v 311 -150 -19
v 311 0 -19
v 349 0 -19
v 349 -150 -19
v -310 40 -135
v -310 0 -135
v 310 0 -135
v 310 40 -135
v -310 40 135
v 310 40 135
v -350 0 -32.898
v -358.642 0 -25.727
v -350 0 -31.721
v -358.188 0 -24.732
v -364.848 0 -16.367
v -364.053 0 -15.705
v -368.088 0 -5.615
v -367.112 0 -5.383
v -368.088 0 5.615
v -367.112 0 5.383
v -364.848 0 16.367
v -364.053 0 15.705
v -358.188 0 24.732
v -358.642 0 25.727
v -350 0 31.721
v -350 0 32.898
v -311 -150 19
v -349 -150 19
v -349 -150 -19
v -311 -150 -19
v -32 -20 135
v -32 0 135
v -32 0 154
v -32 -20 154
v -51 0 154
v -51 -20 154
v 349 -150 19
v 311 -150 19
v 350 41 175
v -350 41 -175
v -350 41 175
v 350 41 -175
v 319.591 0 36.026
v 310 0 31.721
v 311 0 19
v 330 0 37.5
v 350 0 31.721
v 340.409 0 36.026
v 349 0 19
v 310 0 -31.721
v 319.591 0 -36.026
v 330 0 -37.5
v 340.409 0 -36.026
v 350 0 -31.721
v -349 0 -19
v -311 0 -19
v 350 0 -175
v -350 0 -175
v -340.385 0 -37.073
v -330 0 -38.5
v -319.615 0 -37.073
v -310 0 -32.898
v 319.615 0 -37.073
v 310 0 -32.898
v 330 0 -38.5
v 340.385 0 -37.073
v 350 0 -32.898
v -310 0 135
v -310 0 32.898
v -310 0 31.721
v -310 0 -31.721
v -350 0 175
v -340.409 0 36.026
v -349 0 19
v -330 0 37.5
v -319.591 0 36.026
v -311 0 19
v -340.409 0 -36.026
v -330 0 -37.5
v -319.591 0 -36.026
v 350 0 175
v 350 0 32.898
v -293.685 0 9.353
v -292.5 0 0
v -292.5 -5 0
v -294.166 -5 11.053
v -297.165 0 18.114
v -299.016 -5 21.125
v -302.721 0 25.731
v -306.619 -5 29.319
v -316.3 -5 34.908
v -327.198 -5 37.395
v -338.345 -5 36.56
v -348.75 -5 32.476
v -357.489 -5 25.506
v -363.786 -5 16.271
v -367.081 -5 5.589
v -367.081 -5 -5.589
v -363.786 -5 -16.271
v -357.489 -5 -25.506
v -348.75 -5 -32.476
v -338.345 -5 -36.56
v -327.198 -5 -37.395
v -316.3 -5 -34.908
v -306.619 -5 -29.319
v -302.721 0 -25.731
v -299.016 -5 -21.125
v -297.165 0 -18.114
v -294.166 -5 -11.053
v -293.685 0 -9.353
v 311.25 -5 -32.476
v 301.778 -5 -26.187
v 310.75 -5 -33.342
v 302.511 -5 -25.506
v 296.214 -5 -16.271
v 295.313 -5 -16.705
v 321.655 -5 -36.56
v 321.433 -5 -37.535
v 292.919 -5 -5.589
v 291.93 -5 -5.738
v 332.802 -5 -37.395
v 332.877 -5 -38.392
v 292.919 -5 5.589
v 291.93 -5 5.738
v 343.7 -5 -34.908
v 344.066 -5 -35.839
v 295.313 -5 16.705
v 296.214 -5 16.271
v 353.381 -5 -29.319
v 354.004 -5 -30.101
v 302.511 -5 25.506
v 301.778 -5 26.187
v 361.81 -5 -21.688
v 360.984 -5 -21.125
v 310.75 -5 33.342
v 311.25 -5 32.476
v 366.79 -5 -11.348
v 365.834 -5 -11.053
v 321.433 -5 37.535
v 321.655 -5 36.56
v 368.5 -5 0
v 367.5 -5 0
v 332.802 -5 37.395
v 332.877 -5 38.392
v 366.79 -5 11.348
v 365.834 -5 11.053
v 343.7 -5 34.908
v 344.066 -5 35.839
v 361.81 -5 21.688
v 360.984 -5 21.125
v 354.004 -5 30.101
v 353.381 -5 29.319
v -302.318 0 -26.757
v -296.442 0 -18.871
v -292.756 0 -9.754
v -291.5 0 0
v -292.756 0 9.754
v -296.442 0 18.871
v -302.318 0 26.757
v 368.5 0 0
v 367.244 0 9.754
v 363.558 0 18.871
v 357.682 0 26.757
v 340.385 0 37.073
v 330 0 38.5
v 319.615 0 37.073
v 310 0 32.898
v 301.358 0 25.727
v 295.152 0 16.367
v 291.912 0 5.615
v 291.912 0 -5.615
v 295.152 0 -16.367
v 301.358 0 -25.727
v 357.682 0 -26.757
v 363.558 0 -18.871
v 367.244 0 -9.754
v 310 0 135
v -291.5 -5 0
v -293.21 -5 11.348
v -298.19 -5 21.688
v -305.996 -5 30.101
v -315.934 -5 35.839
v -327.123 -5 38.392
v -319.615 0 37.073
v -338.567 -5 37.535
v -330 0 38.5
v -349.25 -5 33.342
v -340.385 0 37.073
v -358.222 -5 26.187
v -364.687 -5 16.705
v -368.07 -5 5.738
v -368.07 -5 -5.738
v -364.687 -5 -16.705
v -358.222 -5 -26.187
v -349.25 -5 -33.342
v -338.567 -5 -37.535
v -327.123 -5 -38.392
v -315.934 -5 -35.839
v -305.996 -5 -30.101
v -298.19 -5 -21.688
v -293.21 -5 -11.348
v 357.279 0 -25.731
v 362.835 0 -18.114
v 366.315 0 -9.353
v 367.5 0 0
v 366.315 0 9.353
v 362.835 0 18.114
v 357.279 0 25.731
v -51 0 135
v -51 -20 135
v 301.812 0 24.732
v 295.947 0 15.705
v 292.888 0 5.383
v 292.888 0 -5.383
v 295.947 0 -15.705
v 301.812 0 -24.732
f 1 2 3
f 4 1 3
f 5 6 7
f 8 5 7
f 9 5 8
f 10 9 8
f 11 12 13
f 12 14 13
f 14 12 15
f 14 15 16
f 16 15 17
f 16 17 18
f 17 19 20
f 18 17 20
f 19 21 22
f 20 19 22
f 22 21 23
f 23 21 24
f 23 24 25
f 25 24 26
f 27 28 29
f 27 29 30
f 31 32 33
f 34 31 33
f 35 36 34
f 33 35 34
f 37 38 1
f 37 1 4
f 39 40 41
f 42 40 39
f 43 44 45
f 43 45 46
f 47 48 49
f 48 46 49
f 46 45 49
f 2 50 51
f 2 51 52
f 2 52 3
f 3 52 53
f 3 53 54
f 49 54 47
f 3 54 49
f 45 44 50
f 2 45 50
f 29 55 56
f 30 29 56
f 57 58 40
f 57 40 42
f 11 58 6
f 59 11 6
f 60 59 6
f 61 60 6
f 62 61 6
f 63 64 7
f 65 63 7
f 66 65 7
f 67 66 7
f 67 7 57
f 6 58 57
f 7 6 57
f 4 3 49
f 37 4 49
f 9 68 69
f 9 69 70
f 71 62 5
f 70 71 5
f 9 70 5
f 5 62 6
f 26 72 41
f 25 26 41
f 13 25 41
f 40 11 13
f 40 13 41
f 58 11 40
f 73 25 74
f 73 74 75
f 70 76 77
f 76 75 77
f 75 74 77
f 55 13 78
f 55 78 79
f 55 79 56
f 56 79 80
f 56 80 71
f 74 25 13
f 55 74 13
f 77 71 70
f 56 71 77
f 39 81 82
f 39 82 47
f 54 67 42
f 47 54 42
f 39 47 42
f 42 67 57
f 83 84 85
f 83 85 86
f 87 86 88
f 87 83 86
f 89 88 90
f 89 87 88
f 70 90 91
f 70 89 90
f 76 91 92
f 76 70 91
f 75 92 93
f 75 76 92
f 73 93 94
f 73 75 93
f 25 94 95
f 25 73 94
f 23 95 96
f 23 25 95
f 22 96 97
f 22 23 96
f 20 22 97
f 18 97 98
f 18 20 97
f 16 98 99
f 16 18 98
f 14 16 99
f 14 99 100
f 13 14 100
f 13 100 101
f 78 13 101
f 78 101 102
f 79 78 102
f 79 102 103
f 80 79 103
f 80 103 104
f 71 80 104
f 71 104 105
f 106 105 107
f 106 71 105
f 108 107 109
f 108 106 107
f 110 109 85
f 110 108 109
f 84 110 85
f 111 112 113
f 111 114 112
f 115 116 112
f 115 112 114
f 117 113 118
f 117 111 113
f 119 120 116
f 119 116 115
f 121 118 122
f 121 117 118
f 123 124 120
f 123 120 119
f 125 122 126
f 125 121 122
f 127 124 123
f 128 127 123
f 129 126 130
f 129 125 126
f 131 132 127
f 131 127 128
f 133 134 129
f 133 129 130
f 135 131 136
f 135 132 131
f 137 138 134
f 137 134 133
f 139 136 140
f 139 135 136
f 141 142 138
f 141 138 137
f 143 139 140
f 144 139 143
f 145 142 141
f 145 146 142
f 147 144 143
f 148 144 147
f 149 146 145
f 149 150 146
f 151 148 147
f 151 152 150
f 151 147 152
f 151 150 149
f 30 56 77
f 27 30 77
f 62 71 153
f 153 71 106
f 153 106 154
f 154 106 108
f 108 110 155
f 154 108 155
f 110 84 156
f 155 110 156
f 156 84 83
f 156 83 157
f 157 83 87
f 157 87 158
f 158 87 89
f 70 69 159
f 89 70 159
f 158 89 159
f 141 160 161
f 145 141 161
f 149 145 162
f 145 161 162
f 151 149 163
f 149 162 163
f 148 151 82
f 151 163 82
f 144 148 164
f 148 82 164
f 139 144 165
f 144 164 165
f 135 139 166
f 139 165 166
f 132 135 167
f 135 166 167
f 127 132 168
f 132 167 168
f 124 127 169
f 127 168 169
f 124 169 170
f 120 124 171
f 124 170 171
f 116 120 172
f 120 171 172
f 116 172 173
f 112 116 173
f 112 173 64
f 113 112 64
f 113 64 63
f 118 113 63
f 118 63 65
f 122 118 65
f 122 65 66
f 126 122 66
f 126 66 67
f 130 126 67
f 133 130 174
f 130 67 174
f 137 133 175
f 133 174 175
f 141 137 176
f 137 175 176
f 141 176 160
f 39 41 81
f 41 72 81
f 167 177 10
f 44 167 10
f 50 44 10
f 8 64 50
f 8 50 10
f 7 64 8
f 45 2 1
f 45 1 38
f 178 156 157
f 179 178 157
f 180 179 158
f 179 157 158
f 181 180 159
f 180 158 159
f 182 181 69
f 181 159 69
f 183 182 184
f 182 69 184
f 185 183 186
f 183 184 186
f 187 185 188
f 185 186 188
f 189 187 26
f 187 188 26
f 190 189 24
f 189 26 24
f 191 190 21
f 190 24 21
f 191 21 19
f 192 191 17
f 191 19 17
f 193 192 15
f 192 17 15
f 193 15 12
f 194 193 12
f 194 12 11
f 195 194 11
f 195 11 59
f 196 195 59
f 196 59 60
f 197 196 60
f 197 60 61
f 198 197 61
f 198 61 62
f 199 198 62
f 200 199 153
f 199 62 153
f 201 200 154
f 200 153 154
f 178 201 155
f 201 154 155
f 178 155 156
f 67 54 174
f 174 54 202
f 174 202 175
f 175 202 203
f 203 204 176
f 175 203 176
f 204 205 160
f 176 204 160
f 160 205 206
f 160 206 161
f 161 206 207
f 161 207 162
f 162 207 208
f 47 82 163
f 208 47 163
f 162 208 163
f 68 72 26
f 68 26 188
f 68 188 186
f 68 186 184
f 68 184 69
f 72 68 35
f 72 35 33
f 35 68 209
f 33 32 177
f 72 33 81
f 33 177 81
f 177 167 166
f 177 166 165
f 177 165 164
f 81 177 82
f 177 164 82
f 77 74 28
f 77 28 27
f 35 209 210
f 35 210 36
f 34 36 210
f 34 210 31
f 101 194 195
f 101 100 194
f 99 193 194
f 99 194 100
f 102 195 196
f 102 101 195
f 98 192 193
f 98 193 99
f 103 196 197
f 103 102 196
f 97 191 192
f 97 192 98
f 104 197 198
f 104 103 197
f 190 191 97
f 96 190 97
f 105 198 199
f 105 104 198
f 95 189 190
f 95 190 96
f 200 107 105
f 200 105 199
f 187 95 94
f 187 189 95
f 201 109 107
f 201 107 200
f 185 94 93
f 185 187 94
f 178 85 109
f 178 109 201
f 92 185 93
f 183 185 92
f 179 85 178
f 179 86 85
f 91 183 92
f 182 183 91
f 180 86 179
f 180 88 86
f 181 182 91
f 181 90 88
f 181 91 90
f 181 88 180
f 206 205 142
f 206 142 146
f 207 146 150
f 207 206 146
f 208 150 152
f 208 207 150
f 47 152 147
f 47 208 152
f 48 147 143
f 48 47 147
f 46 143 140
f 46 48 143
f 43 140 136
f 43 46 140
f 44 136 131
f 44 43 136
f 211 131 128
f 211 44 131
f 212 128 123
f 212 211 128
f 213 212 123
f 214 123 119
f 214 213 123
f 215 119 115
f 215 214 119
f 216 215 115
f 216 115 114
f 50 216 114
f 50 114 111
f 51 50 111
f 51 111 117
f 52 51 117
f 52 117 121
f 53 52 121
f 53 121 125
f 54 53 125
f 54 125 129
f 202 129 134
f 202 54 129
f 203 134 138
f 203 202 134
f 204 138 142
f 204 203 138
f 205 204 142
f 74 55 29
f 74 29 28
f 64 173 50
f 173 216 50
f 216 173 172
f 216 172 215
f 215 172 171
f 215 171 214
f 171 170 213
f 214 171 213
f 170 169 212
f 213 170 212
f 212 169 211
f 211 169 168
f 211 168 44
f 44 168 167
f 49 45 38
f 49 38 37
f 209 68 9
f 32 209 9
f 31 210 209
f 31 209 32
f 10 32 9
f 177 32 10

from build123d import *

# Parameters (mm, degrees)
SKETCH1_W           = 700
SKETCH1_H           = 350
SKETCH1_W_2         = 620
SKETCH1_H_2         = 270
BOSS_EXTRUDE1_DEPTH = 40
SKETCH2_W           = 700
SKETCH2_H           = 350
BOSS_EXTRUDE2_DEPTH = 1
SKETCH3_W           = 38
SKETCH3_H           = 38
BOSS_EXTRUDE3_DEPTH = 150
SKETCH4_W           = 19
SKETCH4_H           = 19
BOSS_EXTRUDE4_DEPTH = 20
SKETCH5_R           = 38.5
SKETCH5_R_2         = 37.5
BOSS_EXTRUDE5_DEPTH = 5


with BuildPart() as part:
    # Sketch1 → Boss-Extrude1 (new body)
    with BuildSketch(Plane(origin=(0, 0, 0), x_dir=(1, 0, 0), z_dir=(0, 1, 0))):
        Rectangle(SKETCH1_W, SKETCH1_H)
        Rectangle(SKETCH1_W_2, SKETCH1_H_2, mode=Mode.SUBTRACT)
    extrude(amount=BOSS_EXTRUDE1_DEPTH)

    # Sketch2 → Boss-Extrude2 (add)
    with BuildSketch(Plane(origin=(0, 40, 0), x_dir=(1, 0, 0), z_dir=(0, 1, 0))):
        Rectangle(SKETCH2_W, SKETCH2_H)
    extrude(amount=BOSS_EXTRUDE2_DEPTH)

    # Sketch3 → Boss-Extrude3 (add)
    with BuildSketch(Plane.XZ):
        with Locations((-330, 0)):
            Rectangle(SKETCH3_W, SKETCH3_H)
        with Locations((330, 0)):
            Rectangle(SKETCH3_W, SKETCH3_H)
    extrude(amount=BOSS_EXTRUDE3_DEPTH)

    # Sketch4 → Boss-Extrude4 (add)
    with BuildSketch(Plane.XZ):
        with Locations((-41.5, 144.5)):
            Rectangle(SKETCH4_W, SKETCH4_H)
    extrude(amount=BOSS_EXTRUDE4_DEPTH)

    # Sketch5 → Boss-Extrude5 (add)
    with BuildSketch(Plane.XZ):
        with Locations((-330, 0)):
            Circle(SKETCH5_R)
        with Locations((-330, 0)):
            Circle(SKETCH5_R_2, mode=Mode.SUBTRACT)
        with Locations((330, 0)):
            Circle(SKETCH5_R)
        with Locations((330, 0)):
            Circle(SKETCH5_R_2, mode=Mode.SUBTRACT)
    extrude(amount=BOSS_EXTRUDE5_DEPTH)


solid = part.part
